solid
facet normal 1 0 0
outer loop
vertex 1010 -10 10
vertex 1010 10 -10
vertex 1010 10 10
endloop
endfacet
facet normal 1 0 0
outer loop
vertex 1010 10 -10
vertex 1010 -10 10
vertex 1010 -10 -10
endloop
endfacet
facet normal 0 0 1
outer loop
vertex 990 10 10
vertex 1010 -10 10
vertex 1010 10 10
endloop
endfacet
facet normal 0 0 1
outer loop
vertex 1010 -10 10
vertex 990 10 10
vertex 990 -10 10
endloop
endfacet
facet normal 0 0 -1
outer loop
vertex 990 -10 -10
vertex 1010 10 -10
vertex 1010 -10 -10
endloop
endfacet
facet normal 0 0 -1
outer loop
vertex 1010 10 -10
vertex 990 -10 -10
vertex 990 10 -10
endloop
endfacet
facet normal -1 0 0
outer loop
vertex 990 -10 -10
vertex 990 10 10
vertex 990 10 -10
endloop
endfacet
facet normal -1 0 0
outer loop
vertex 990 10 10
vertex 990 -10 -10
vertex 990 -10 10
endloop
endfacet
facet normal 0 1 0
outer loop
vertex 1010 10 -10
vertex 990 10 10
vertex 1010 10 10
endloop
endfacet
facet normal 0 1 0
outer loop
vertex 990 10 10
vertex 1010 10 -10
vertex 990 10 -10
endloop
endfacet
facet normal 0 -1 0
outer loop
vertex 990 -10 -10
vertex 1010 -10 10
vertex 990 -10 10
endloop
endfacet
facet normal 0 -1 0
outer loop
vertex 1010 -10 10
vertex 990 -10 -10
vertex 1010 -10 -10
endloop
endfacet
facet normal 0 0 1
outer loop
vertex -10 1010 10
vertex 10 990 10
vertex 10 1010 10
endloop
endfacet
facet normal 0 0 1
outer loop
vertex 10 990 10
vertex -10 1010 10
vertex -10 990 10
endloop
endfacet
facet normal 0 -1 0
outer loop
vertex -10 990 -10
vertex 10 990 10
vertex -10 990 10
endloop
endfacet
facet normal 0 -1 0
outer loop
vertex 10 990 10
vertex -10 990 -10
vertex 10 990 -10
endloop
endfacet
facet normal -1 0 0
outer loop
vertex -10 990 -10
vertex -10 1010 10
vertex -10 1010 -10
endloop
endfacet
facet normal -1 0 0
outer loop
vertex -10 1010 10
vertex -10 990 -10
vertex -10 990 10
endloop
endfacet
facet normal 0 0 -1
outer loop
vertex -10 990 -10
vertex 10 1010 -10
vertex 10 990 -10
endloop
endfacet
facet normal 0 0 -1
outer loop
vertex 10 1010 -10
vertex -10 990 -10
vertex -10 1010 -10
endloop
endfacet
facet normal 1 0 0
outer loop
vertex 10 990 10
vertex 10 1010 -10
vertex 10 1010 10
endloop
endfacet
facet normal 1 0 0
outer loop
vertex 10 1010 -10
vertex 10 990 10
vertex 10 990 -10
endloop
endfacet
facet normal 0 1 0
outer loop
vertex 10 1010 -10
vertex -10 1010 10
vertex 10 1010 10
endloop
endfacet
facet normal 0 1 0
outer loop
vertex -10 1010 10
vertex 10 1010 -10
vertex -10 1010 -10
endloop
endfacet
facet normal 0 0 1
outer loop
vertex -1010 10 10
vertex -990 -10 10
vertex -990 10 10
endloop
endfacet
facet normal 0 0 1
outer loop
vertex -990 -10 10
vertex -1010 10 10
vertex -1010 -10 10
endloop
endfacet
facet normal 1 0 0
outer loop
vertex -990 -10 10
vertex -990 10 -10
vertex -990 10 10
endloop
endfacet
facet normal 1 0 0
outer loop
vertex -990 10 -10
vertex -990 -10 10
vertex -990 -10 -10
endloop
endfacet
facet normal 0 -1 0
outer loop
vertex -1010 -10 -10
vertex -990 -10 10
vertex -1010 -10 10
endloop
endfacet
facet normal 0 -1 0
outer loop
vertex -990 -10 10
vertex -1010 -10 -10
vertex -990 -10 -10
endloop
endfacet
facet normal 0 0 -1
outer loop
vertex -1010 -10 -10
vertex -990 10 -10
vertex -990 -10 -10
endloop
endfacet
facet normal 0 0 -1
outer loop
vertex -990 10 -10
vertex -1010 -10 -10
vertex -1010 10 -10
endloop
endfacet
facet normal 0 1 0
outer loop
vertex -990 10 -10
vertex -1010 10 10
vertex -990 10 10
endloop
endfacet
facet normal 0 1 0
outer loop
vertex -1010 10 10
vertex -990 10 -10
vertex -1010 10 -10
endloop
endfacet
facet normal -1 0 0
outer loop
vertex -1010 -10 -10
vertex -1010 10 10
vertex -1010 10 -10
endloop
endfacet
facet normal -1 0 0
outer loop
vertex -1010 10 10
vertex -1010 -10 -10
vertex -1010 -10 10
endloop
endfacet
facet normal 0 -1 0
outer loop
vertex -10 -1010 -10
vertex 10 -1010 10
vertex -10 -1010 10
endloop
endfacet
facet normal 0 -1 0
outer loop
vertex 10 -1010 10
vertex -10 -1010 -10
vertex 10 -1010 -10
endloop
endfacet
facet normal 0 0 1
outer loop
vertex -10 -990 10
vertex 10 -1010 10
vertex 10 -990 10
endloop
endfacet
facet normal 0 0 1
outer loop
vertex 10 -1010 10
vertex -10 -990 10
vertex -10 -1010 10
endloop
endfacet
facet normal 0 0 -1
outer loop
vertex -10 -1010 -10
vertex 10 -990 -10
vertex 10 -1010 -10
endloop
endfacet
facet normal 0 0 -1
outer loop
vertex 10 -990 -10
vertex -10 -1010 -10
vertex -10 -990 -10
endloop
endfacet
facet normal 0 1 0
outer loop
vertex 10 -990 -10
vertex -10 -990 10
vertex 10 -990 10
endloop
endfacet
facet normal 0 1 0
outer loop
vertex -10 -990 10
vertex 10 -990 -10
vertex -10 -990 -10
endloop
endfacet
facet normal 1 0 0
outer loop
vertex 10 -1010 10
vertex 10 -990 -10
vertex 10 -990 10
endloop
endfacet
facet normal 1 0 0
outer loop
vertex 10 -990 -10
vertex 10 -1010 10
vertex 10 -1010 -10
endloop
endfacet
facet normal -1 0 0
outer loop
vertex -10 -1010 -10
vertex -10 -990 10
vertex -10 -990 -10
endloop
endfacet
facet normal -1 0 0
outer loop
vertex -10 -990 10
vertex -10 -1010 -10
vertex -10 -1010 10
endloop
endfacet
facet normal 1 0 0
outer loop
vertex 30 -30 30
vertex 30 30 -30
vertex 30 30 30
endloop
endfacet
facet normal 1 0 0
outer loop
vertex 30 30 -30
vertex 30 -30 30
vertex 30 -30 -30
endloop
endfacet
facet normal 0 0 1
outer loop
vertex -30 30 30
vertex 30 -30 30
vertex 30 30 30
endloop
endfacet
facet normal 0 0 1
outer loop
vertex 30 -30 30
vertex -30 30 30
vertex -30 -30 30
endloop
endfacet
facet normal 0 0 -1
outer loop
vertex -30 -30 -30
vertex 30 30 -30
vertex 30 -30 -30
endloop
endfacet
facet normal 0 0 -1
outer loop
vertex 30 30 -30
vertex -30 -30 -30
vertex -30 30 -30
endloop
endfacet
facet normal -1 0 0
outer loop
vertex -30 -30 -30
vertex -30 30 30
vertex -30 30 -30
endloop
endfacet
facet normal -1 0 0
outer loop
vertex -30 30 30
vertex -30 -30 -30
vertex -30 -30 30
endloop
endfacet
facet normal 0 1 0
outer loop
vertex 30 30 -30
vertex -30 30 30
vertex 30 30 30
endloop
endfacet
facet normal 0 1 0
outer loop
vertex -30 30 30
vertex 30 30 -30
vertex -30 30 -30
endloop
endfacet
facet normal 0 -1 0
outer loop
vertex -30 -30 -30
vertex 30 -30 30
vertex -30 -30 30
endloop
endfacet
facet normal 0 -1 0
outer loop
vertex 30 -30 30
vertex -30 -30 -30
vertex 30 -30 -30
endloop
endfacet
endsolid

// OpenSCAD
// Depth shading must not change as the viewport rotates.
//
// A large cube on the centre of rotation, surrounded by four small markers a
// thousand units out. The whole scene has four-fold symmetry about Z, so a 90
// degree orbit maps it exactly onto itself: the depth map from either angle must
// be the same image, not merely a similar one. Both tests therefore compare
// against a single expected image.
//
// Note what this does NOT test. The scene's symmetry puts the bounding box centre
// on the rotation centre, so a range derived from the box agrees with one derived
// from the rotation centre and this model passes either way. depthmap-offcentre
// is the asymmetric companion that tells them apart; this one pins exactness,
// that one pins correctness, and neither substitutes for the other.
//
// Deliberately low contrast: the centre cube spans a few percent of a range
// stretched to reach the markers. Stability is the property under test.
cube(60, center = true);
for (a = [0:90:270]) {
  rotate([0, 0, a]) translate([1000, 0, 0]) cube(20, center = true);
}
